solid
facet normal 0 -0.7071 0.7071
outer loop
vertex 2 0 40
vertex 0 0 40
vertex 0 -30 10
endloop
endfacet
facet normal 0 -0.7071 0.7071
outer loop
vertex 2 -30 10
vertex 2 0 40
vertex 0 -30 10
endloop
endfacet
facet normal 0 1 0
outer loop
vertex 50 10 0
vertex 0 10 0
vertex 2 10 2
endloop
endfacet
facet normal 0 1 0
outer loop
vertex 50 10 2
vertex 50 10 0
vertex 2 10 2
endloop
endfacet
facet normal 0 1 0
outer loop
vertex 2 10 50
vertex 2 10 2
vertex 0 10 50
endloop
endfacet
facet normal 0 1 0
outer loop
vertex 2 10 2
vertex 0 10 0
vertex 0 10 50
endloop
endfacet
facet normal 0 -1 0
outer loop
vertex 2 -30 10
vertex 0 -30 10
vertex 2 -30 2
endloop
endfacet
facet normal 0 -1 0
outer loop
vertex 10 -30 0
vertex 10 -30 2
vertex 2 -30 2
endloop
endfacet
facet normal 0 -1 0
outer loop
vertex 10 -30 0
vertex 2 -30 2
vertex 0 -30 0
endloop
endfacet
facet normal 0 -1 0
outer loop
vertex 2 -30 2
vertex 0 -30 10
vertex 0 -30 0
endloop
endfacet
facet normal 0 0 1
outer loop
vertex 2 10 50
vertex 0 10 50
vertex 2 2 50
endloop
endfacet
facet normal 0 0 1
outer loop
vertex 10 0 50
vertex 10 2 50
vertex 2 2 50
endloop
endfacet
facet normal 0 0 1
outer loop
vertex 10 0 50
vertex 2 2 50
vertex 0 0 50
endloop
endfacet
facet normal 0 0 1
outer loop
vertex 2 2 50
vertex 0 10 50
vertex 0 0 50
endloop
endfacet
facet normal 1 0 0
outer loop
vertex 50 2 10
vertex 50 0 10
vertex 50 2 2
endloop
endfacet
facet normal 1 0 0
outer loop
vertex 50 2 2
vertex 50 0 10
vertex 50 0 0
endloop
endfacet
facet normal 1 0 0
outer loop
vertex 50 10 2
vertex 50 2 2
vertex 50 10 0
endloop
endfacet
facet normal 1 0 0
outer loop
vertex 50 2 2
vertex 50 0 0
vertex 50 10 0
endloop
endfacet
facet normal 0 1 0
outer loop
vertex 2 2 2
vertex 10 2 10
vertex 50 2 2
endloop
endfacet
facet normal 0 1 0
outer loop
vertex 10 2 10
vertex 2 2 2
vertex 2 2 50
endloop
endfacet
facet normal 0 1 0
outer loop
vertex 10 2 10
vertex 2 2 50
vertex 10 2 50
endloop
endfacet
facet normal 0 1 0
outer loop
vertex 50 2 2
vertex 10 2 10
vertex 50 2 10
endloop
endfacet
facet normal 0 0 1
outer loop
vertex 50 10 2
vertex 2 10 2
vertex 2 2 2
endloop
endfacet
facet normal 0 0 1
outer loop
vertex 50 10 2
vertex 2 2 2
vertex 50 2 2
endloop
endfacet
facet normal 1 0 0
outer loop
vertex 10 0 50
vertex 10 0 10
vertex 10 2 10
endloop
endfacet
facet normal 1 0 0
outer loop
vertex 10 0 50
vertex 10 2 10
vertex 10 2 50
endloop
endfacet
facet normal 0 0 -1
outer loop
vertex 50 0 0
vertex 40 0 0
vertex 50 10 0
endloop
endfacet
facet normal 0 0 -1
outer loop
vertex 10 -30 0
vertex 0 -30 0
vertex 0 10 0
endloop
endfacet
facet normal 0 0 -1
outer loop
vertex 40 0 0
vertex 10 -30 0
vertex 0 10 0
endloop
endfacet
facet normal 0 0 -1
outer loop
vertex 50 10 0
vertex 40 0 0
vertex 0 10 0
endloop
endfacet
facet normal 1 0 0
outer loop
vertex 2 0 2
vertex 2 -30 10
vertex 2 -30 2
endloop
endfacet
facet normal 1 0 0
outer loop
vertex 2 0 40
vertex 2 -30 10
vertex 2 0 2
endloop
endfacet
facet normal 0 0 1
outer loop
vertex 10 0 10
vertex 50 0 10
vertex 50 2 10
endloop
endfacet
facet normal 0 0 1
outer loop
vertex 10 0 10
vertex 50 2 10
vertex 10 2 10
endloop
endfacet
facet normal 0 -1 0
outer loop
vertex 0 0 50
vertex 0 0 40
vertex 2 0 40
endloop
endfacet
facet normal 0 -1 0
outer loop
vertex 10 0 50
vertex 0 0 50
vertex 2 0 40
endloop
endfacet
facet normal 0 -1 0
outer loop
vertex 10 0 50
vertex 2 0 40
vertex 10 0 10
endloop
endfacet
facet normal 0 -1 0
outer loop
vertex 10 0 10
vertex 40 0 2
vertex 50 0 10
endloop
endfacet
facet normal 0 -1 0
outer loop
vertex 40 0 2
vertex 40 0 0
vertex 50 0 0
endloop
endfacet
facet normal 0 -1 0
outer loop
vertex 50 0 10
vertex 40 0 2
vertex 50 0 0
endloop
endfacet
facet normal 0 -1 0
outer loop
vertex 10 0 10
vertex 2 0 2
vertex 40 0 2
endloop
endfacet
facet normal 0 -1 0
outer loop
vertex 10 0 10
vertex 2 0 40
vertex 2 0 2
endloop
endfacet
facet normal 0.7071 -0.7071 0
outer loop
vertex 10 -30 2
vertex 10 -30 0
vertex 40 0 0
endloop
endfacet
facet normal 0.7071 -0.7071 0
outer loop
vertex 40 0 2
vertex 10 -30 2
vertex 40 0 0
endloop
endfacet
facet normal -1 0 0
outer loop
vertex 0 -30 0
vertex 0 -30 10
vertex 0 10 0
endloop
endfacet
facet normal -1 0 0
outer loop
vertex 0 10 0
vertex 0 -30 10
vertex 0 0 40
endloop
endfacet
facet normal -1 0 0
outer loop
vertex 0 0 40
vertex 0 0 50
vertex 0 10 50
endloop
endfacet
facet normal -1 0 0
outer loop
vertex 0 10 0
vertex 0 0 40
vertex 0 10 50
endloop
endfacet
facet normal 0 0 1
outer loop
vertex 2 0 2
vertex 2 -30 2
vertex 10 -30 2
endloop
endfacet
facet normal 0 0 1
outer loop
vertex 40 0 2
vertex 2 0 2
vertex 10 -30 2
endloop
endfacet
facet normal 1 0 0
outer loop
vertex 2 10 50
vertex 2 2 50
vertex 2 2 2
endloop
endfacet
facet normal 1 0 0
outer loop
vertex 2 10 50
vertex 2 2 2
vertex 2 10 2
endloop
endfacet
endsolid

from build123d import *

# Parameters (mm, degrees)
F3_DEPTH = 2
F4_DEPTH = 2
F5_DEPTH = 2


with BuildPart() as f3:
    # F1 (on Right) → F3 (new body)
    with BuildSketch(Plane.YZ):
        Polygon((-30, 0), (10, 0), (10, 50), (0, 50), (0, 40), (-30, 10), align=None)
    extrude(amount=F3_DEPTH)

    # F0 (on Top) → F4 (join)
    with BuildSketch(Plane.XY):
        Polygon((0, 10), (0, -30), (10, -30), (40, 0), (50, 0), (50, 10), align=None)
    extrude(amount=F4_DEPTH)

    # F2 (on Front) → F5 (join)
    with BuildSketch(Plane.XZ):
        Polygon((0, 0), (40, 0), (50, 0), (50, 10), (10, 10), (10, 50), (0, 50), (0, 40), align=None)
    extrude(amount=-F5_DEPTH)


solid = f3.part
